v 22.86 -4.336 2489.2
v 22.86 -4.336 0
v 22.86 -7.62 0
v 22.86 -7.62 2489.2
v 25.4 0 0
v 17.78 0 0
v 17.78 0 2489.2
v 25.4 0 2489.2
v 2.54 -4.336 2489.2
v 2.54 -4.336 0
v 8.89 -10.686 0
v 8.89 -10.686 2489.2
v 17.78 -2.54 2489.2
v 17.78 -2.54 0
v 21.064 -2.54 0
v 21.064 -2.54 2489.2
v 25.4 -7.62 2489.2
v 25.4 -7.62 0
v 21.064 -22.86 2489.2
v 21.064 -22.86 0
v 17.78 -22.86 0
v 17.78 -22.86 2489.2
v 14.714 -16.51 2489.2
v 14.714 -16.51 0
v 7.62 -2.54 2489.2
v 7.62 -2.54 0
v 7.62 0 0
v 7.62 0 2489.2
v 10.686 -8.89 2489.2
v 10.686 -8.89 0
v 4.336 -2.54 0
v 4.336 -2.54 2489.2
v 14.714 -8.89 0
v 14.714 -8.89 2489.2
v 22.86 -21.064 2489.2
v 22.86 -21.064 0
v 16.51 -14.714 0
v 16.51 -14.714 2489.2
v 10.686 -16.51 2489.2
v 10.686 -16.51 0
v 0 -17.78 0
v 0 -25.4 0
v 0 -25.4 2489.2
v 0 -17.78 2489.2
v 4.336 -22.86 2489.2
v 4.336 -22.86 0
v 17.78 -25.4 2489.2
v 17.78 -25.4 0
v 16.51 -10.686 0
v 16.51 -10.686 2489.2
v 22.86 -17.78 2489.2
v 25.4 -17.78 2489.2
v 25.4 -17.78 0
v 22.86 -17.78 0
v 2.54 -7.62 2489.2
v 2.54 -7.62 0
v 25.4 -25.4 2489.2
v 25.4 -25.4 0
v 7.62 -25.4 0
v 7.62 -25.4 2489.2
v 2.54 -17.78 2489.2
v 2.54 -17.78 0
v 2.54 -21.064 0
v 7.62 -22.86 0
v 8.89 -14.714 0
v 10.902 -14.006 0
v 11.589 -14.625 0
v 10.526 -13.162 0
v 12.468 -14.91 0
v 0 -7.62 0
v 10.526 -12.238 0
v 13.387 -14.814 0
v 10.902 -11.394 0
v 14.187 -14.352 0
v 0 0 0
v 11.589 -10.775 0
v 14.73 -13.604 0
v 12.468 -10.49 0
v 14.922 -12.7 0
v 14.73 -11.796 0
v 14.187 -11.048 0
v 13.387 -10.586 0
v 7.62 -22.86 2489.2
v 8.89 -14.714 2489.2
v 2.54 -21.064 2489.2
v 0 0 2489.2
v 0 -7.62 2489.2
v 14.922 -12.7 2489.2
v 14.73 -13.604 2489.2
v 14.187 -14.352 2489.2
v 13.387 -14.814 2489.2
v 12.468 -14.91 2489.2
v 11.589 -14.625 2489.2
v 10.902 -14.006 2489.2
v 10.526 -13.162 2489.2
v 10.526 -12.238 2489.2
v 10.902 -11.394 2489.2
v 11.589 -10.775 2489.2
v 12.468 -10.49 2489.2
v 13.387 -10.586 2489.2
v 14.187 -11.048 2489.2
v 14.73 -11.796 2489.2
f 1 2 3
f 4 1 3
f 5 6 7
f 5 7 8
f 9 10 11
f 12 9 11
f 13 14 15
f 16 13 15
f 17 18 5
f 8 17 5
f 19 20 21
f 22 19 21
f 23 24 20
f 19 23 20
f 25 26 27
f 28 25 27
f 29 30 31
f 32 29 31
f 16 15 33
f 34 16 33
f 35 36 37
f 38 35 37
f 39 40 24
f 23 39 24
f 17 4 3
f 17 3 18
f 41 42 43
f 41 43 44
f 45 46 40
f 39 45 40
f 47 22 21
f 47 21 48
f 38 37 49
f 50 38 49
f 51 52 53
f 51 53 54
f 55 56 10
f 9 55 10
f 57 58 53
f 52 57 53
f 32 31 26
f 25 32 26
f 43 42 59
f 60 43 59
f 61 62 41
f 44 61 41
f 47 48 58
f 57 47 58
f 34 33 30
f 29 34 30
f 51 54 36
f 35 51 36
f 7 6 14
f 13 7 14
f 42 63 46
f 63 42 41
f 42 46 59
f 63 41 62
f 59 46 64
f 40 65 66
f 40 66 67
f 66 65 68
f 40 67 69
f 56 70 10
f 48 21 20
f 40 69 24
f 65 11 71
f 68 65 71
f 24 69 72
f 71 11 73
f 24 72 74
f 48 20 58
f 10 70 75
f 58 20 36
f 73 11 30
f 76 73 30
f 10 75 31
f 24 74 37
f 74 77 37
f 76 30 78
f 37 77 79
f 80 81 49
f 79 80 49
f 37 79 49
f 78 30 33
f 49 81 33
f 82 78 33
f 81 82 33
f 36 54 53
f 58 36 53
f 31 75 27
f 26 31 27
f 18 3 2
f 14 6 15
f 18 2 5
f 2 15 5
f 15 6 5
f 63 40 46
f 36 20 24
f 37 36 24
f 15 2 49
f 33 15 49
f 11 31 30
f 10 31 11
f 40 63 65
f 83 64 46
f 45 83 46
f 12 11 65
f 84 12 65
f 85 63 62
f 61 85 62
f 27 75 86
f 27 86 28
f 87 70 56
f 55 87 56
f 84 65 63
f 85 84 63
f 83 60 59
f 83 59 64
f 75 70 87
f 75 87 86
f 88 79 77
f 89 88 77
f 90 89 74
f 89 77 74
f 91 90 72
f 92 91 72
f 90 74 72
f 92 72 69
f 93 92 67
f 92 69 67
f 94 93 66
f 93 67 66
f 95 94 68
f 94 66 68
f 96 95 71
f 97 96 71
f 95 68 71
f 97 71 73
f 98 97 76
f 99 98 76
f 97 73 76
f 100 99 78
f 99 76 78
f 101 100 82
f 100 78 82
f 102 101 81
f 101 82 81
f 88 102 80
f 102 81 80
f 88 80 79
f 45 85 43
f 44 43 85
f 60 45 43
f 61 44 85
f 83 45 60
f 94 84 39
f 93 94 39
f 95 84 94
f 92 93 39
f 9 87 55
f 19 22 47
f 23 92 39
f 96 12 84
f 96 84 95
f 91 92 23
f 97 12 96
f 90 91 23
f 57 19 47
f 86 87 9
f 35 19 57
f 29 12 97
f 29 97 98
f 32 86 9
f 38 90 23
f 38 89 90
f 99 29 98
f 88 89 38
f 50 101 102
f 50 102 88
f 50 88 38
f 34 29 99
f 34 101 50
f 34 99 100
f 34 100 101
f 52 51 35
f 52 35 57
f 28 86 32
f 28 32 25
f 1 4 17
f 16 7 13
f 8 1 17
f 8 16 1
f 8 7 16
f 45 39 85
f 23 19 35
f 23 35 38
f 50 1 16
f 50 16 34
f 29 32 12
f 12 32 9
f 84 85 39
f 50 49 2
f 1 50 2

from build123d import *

# Parameters (mm, degrees)
F0_W     = 25.4
F0_H     = 25.4
F1_DEPTH = 2489.2
F3_DEPTH = 2489.2
F4_R     = 2.2225
F5_DEPTH = 2489.2


with BuildPart() as f1:
    # F0 (on Top) → F1 (new body)
    with BuildSketch(Plane.XY):
        with Locations((12.7, -12.7)):
            Rectangle(F0_W, F0_H)
    extrude(amount=F1_DEPTH)

    # F2 (on face) → F3 (cut)
    with BuildSketch(Plane(origin=(0, 0, 0), x_dir=(1, 0, 0), z_dir=(0, 0, -1))):
        Polygon((2.54, 17.78), (0, 17.78), (0, 7.62), (2.54, 7.62), (2.54, 4.336051), (8.89, 10.686051), (8.89, 14.713949), (2.54, 21.063949), align=None)
        Polygon((7.62, 2.54), (7.62, 0), (17.78, 0), (17.78, 2.54), (21.063949, 2.54), (14.713949, 8.89), (10.686051, 8.89), (4.336051, 2.54), align=None)
        Polygon((25.4, 7.62), (25.4, 17.78), (22.86, 17.78), (22.86, 21.063949), (16.51, 14.713949), (16.51, 10.686051), (22.86, 4.336051), (22.86, 7.62), align=None)
        Polygon((17.78, 25.4), (7.62, 25.4), (7.62, 22.86), (4.336051, 22.86), (10.686051, 16.51), (12.7, 16.51), (14.713949, 16.51), (21.063949, 22.86), (17.78, 22.86), align=None)
    extrude(amount=-F3_DEPTH, mode=Mode.SUBTRACT)

    # F4 (on face) → F5 (cut)
    with BuildSketch(Plane(origin=(0, 0, 0), x_dir=(1, 0, 0), z_dir=(0, 0, -1))):
        with Locations((12.7, 12.7)):
            Circle(F4_R)
    extrude(amount=-F5_DEPTH, mode=Mode.SUBTRACT)


solid = f1.part
